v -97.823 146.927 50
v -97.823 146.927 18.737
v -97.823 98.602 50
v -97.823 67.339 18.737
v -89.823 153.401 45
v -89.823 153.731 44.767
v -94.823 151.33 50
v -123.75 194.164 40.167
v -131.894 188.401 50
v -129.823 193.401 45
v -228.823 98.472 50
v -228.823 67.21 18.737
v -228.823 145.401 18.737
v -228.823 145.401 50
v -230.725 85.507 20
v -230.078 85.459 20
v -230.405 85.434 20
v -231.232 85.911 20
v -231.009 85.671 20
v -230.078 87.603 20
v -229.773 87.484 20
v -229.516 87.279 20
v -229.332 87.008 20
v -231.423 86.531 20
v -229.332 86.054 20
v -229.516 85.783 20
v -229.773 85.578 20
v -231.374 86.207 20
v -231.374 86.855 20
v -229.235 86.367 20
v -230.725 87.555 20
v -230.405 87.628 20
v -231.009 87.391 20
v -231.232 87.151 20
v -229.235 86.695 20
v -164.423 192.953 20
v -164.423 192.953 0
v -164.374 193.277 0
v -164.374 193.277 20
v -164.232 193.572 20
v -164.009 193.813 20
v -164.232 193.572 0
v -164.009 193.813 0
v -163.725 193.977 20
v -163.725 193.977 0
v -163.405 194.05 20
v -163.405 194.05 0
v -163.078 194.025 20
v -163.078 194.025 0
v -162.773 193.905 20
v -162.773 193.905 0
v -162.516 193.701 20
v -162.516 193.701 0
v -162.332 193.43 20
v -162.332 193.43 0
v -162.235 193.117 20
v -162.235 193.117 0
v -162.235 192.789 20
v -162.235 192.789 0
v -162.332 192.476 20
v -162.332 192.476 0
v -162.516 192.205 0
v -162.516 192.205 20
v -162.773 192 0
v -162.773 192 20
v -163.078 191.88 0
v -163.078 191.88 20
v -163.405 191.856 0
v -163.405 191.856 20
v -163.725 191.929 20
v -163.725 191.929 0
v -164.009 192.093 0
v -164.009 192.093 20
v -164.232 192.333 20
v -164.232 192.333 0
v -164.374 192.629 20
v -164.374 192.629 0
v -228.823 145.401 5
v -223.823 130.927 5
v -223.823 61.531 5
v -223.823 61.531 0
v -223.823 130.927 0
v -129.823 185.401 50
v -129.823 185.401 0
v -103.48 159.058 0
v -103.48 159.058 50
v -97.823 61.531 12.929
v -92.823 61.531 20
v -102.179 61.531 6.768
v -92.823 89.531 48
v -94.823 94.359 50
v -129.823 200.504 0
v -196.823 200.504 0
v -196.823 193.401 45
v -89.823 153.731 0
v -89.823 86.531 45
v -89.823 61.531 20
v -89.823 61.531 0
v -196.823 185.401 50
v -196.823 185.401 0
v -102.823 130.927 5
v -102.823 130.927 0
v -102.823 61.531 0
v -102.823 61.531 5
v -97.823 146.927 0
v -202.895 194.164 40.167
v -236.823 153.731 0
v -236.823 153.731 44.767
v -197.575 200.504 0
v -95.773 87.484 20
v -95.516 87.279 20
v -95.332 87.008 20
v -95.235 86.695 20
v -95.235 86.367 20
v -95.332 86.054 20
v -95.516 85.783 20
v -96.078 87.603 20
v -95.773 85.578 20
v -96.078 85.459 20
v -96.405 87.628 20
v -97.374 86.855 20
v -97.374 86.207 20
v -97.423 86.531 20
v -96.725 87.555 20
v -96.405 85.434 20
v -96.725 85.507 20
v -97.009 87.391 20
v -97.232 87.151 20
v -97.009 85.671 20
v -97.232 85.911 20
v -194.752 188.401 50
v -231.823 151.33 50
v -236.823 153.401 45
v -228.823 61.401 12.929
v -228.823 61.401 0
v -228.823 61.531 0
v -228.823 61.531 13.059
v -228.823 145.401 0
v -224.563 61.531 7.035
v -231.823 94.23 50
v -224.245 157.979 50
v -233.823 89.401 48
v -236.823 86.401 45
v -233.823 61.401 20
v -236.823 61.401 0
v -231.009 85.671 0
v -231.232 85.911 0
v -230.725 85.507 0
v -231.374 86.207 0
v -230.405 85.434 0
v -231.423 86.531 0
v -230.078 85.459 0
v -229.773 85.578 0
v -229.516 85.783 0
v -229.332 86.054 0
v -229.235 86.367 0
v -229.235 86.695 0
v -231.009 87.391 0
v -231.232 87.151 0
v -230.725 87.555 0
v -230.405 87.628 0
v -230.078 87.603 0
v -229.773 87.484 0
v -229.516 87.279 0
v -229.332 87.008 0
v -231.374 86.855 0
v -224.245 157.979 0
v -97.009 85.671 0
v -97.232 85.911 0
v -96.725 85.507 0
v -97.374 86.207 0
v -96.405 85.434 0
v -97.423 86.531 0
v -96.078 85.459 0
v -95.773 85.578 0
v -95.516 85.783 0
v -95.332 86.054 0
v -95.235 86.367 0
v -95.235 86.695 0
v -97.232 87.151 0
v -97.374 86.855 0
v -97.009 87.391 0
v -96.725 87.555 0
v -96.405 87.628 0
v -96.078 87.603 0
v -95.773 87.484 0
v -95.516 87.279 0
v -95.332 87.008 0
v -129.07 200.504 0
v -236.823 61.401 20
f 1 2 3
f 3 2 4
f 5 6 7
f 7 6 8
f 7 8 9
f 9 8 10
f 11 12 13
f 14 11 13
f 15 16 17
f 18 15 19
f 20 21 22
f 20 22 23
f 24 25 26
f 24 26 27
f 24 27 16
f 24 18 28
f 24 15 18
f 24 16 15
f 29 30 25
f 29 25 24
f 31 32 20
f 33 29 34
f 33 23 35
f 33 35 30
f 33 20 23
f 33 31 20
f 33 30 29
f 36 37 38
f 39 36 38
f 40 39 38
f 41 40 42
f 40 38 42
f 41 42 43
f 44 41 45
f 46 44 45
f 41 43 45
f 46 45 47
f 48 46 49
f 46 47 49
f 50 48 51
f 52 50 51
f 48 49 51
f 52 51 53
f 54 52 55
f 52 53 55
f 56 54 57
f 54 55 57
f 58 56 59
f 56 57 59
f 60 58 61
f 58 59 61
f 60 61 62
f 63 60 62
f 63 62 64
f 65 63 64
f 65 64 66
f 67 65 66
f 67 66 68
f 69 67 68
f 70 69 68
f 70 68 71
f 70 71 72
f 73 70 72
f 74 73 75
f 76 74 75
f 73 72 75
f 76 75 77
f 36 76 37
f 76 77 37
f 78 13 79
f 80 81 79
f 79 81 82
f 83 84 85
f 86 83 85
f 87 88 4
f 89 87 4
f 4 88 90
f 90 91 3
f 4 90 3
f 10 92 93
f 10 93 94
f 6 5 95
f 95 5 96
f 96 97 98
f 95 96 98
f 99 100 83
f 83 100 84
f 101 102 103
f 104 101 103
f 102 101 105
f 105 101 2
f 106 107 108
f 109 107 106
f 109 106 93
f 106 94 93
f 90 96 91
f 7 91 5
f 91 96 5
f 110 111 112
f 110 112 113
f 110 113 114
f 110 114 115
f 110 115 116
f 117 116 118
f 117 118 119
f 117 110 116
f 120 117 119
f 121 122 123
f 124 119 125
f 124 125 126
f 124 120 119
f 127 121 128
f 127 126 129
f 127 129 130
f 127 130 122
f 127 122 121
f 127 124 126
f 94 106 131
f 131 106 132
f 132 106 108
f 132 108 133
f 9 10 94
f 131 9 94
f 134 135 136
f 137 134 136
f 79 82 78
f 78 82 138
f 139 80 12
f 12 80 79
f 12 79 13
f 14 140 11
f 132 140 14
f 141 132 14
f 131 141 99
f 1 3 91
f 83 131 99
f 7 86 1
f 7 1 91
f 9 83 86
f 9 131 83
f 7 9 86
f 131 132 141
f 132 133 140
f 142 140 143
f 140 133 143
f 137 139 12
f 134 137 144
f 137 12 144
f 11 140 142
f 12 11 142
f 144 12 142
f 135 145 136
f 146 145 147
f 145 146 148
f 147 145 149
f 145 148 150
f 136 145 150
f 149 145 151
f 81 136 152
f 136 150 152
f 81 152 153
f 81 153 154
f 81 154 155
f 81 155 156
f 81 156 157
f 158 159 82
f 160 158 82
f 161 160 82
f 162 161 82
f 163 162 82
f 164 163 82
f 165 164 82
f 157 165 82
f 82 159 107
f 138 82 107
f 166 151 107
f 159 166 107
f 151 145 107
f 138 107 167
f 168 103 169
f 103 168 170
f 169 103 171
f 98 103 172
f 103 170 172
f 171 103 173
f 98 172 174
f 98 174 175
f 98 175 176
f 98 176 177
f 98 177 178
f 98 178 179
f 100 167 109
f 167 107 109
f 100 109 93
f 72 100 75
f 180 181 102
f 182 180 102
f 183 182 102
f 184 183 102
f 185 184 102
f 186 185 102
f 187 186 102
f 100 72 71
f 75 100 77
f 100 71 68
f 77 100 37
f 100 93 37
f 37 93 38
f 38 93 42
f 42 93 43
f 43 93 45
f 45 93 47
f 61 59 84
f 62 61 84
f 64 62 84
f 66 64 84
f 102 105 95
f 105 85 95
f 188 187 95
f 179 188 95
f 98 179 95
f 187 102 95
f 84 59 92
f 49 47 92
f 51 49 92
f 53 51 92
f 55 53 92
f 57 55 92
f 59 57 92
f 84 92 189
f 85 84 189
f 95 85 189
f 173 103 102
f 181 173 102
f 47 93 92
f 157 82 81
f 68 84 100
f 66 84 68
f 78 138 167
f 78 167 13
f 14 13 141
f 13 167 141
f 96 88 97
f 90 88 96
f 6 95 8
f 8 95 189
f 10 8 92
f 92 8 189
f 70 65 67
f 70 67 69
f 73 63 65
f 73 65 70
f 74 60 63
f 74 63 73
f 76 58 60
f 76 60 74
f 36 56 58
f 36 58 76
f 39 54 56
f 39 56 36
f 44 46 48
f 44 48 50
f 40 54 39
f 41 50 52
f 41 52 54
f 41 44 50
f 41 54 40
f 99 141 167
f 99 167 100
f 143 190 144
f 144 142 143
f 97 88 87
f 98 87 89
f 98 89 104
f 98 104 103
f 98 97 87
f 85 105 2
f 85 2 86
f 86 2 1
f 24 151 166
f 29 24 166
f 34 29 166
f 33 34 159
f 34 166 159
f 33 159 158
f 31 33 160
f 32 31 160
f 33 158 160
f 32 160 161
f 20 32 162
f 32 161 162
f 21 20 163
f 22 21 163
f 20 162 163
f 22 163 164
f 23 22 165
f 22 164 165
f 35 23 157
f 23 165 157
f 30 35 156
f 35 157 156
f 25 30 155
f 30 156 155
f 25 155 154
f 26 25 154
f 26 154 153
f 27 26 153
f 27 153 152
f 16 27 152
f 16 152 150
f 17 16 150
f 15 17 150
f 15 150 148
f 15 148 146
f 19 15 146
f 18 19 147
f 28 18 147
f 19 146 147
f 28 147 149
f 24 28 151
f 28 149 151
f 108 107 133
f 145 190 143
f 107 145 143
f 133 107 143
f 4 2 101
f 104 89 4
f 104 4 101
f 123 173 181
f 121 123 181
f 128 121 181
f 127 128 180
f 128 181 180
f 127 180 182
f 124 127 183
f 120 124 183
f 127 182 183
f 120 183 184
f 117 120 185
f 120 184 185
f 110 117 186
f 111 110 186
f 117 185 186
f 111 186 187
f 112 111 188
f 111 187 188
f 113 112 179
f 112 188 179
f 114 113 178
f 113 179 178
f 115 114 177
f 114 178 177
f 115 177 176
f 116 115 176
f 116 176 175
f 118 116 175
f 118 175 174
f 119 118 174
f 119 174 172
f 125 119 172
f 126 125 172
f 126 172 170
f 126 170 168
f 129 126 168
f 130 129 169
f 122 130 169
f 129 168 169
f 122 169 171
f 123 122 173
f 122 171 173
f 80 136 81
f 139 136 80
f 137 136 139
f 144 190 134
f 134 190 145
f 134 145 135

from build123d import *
from OCP.BRepFilletAPI import BRepFilletAPI_MakeChamfer

# Parameters (mm, degrees)
EXTRUDE_2_DEPTH     = 50
CHAMFER_1_SIZE      = 30
CHAMFER_2_SIZE      = 5
CHAMFER_3_SIZE      = 5
EXTRUDE_3_DEPTH     = 67
CHAMFER_6_SIZE      = 8
CHAMFER_6_SIZE2     = 6.474308837
CHAMFER_7_SIZE      = 59.001285691
CHAMFER_7_SIZE_2    = 8
CHAMFER_8_SIZE      = 59.001285691
CHAMFER_8_SIZE_2    = 8
EXTRUDE_4_DEPTH     = 5
CHAMFER_9_SIZE      = 13.737387097
CHAMFER_9_SIZE_2    = 5
SKETCH_5_R          = 1.1
CUT_EXTRUDE_1_DEPTH = 20


with BuildPart() as part:
    # Эскиз2 → Бобышка-Вытянуть2 (new body)
    with BuildSketch(Plane.XY):
        Polygon((-228.822789272, 61.401300251), (-228.822789272, 153.401300251), (-196.822789272, 185.401300251), (-129.822789272, 185.401300251), (-97.822789272, 153.401300251), (-97.822789272, 61.530932705), (-89.822789272, 61.530932705), (-89.822789272, 153.401300251), (-129.822789272, 193.401300251), (-196.822789272, 193.401300251), (-236.822789272, 153.401300251), (-236.822789272, 61.401300251), align=None)
    extrude(amount=EXTRUDE_2_DEPTH)

    # Фаска1
    chamfer_1_edges = [part.edges().sort_by_distance(p)[0] for p in [
        (-93.822789272, 61.530932705, 50),
        (-232.822789272, 61.401300251, 50),
    ]]
    chamfer(chamfer_1_edges, length=CHAMFER_1_SIZE)

    # Фаска2
    chamfer_2_edges = [part.edges().sort_by_distance(p)[0] for p in [
        (-109.822789272, 173.401300251, 50),
        (-89.822789272, 122.466116478, 50),
        (-163.322789272, 193.401300251, 50),
        (-216.822789272, 173.401300251, 50),
        (-236.822789272, 122.401300251, 50),
    ]]
    chamfer(chamfer_2_edges, length=CHAMFER_2_SIZE)

    # Фаска3
    chamfer_3_edges = [part.edges().sort_by_distance(p)[0] for p in [
        (-97.822789272, 76.530932705, 35),
        (-228.822789272, 76.401300251, 35),
    ]]
    chamfer(chamfer_3_edges, length=CHAMFER_3_SIZE)

    # Эскиз3 → Бобышка-Вытянуть3 (add)
    with BuildSketch(Plane(origin=(-129.822789272, 0, 0), x_dir=(0, 0, -1), z_dir=(1, 0, 0))):
        Polygon((-45, 193.401300251), (0, 193.401300251), (0, 200.504313431), align=None)
    extrude(amount=-EXTRUDE_3_DEPTH)

    # Фаска6: one chamfer whose edges measure the first distance from different faces: ONE call of the kernel's chamfer builder (chamfer() names one face for all edges)
    chamfer_6_edges_1 = [part.edges().sort_by_distance(p)[0] for p in [
        (-97.822789272, 153.401300251, 25),
    ]]
    chamfer_6_side_1 = [part.faces().sort_by_distance(p)[0] for p in [
        (-113.822789272, 169.401300251, 25),
    ]]
    chamfer_6_edges_2 = [part.edges().sort_by_distance(p)[0] for p in [
        (-228.822789272, 153.401300251, 25),
    ]]
    chamfer_6_side_2 = [part.faces().sort_by_distance(p)[0] for p in [
        (-228.822789272, 113.309285826, 22.779788417),
    ]]
    chamfer_6 = BRepFilletAPI_MakeChamfer(part.part.solid().wrapped)
    for e in chamfer_6_edges_1:
        chamfer_6.Add(CHAMFER_6_SIZE, CHAMFER_6_SIZE2, e.wrapped, chamfer_6_side_1[0].wrapped)  # the first distance lies on this face
    for e in chamfer_6_edges_2:
        chamfer_6.Add(CHAMFER_6_SIZE, CHAMFER_6_SIZE2, e.wrapped, chamfer_6_side_2[0].wrapped)  # the first distance lies on this face
    add(Compound.cast(chamfer_6.Shape()), mode=Mode.REPLACE)

    # Фаска7
    # the kernel refuses this chamfer: 59.001285691, 8 mm, written as the material it adds along each edge
    with BuildSketch(Plane(origin=(-196.822789272, 193.401300251, 0), x_dir=(-0.7047321498610482, -0.7094734645863968, 0), z_dir=(0, 0, 1))) as chamfer_7_piece_1_section:
        Polygon((CHAMFER_7_SIZE * 0.999994379973, -CHAMFER_7_SIZE * 0.00335261579405), (-CHAMFER_7_SIZE_2 * 0.709473464586, -CHAMFER_7_SIZE_2 * 0.704732149861), (0, 0), align=None)
    chamfer_7_piece_1 = extrude(amount=198.381753037, mode=Mode.PRIVATE)
    chamfer_7_piece_1 = split(chamfer_7_piece_1, bisect_by=Plane(origin=(-220.880283212, 186.62893037, 32.777571564), z_dir=(0.49999999999999994, -0.5, -0.7071067811865477)), keep=Keep.TOP, mode=Mode.PRIVATE)
    chamfer_7_piece_1 = split(chamfer_7_piece_1, bisect_by=Plane(origin=(-236.822789272, 178.689900101, 21.550087285), z_dir=(1, 0, 0)), keep=Keep.TOP, mode=Mode.PRIVATE)
    chamfer_7_piece_1 = split(chamfer_7_piece_1, bisect_by=Plane(origin=(-212.941252942, 196.655142254, 24.385806214), z_dir=(1.0444770759811184e-15, -0.9877705725829901, -0.1559143865686293)), keep=Keep.TOP, mode=Mode.PRIVATE)
    add(chamfer_7_piece_1)

    # Фаска8
    # the kernel refuses this chamfer: 59.001285691, 8 mm, written as the material it adds along each edge
    with BuildSketch(Plane(origin=(-129.822789272, 193.401300251, 0), x_dir=(0.7047321498610463, -0.7094734645863986, 0), z_dir=(0, 0, 1))) as chamfer_8_piece_1_section:
        Polygon((CHAMFER_8_SIZE * 0.999994379973, CHAMFER_8_SIZE * 0.00335261579405), (-CHAMFER_8_SIZE_2 * 0.709473464586, CHAMFER_8_SIZE_2 * 0.704732149861), (0, 0), align=None)
    chamfer_8_piece_1 = extrude(amount=198.381753037, mode=Mode.PRIVATE)
    chamfer_8_piece_1 = split(chamfer_8_piece_1, bisect_by=Plane(origin=(-89.822789272, 178.689900101, 21.550087285), z_dir=(-1, 0, 0)), keep=Keep.TOP, mode=Mode.PRIVATE)
    chamfer_8_piece_1 = split(chamfer_8_piece_1, bisect_by=Plane(origin=(-105.765295333, 186.62893037, 32.777571565), z_dir=(-0.5000000000000016, -0.4999999999999975, -0.7071067811865482)), keep=Keep.TOP, mode=Mode.PRIVATE)
    chamfer_8_piece_1 = split(chamfer_8_piece_1, bisect_by=Plane(origin=(-113.704325602, 196.655142254, 24.385806214), z_dir=(0, -0.9877705725829332, -0.15591438656898948)), keep=Keep.TOP, mode=Mode.PRIVATE)
    add(chamfer_8_piece_1)

    # Эскиз4 → Бобышка-Вытянуть4 (add)
    with BuildSketch(Plane(origin=(0, 0, 0), x_dir=(-1, 0, 0), z_dir=(0, 0, -1))):
        Polygon((97.822789272, 146.926991414), (102.822789272, 130.926991414), (102.822789272, 61.530932705), (97.822789272, 61.530932705), align=None)
        Polygon((228.822789272, 145.401300251), (228.822789272, 61.530932705), (223.822789272, 61.530932705), (223.822789272, 130.926991414), align=None)
    extrude(amount=-EXTRUDE_4_DEPTH)

    # Фаска9
    # the kernel refuses this chamfer: 13.737387097, 5 mm, written as the material it adds along each edge
    with BuildSketch(Plane(origin=(-97.822789272, 61.530932705, 5), x_dir=(0.013184058198649358, 0, 0.9999130865277315), z_dir=(0, 1, 0))) as chamfer_9_piece_1_section:
        Polygon((CHAMFER_9_SIZE * 0.999913086548, -CHAMFER_9_SIZE * 0.0131840581989), (-CHAMFER_9_SIZE_2 * 0.0131840581986, -CHAMFER_9_SIZE_2 * 0.999913086528), (0, 0), align=None)
    chamfer_9_piece_1 = extrude(amount=121.033515956, mode=Mode.PRIVATE)
    chamfer_9_piece_1 = split(chamfer_9_piece_1, bisect_by=Plane(origin=(-114.063470216, 91.772466116, 20.202674346), z_dir=(0.7071067811865477, 0.5, -0.4999999999999999)), keep=Keep.TOP, mode=Mode.PRIVATE)
    chamfer_9_piece_1 = split(chamfer_9_piece_1, bisect_by=Plane(origin=(-110.682470029, 105.776012992, 9.758348452), z_dir=(0.9544799780350295, -0.2982749931359476, 0)), keep=Keep.TOP, mode=Mode.PRIVATE)
    chamfer_9_piece_1 = split(chamfer_9_piece_1, bisect_by=Plane(origin=(-102.822789272, 102.21679201, 9.758348452), z_dir=(1, 0, 0)), keep=Keep.TOP, mode=Mode.PRIVATE)
    add(chamfer_9_piece_1)
    with BuildSketch(Plane(origin=(-228.822789272, 181.038757498, 5), x_dir=(0.9950833631817486, 0, -0.09904090225205033), z_dir=(0, -1, 0))) as chamfer_9_piece_2_section:
        Polygon((CHAMFER_9_SIZE_2 * 0.995083363182, CHAMFER_9_SIZE_2 * 0.0990409022521), (-CHAMFER_9_SIZE * 0.099040902254, CHAMFER_9_SIZE * 0.995083363202), (0, 0), align=None)
    chamfer_9_piece_2 = extrude(amount=119.507824793, mode=Mode.PRIVATE)
    chamfer_9_piece_2 = split(chamfer_9_piece_2, bisect_by=Plane(origin=(-199.458401516, 124.497296703, 34.497413224), z_dir=(-0.7071067811865471, 0.5000000000000006, -0.5000000000000001)), keep=Keep.TOP, mode=Mode.PRIVATE)
    chamfer_9_piece_2 = split(chamfer_9_piece_2, bisect_by=Plane(origin=(-228.851428884, 145.484207968, 13.577093316), z_dir=(-0.945194554128901, -0.32650766429759087, 0)), keep=Keep.TOP, mode=Mode.PRIVATE)
    chamfer_9_piece_2 = split(chamfer_9_piece_2, bisect_by=Plane(origin=(-223.822789272, 145.417616611, 13.577093316), z_dir=(-1, 0, 0)), keep=Keep.TOP, mode=Mode.PRIVATE)
    add(chamfer_9_piece_2)

    # Эскиз5 → Вырез-Вытянуть1 (cut)
    with BuildSketch(Plane(origin=(0, 0, 0), x_dir=(-1, 0, 0), z_dir=(0, 0, -1))):
        with Locations((96.322789272, 86.530932705)):
            Circle(SKETCH_5_R)
        with Locations((230.322789272, 86.530932705)):
            Circle(SKETCH_5_R)
        with Locations((163.322789272, 192.952806841)):
            Circle(SKETCH_5_R)
    extrude(amount=-CUT_EXTRUDE_1_DEPTH, mode=Mode.SUBTRACT)


solid = part.part
